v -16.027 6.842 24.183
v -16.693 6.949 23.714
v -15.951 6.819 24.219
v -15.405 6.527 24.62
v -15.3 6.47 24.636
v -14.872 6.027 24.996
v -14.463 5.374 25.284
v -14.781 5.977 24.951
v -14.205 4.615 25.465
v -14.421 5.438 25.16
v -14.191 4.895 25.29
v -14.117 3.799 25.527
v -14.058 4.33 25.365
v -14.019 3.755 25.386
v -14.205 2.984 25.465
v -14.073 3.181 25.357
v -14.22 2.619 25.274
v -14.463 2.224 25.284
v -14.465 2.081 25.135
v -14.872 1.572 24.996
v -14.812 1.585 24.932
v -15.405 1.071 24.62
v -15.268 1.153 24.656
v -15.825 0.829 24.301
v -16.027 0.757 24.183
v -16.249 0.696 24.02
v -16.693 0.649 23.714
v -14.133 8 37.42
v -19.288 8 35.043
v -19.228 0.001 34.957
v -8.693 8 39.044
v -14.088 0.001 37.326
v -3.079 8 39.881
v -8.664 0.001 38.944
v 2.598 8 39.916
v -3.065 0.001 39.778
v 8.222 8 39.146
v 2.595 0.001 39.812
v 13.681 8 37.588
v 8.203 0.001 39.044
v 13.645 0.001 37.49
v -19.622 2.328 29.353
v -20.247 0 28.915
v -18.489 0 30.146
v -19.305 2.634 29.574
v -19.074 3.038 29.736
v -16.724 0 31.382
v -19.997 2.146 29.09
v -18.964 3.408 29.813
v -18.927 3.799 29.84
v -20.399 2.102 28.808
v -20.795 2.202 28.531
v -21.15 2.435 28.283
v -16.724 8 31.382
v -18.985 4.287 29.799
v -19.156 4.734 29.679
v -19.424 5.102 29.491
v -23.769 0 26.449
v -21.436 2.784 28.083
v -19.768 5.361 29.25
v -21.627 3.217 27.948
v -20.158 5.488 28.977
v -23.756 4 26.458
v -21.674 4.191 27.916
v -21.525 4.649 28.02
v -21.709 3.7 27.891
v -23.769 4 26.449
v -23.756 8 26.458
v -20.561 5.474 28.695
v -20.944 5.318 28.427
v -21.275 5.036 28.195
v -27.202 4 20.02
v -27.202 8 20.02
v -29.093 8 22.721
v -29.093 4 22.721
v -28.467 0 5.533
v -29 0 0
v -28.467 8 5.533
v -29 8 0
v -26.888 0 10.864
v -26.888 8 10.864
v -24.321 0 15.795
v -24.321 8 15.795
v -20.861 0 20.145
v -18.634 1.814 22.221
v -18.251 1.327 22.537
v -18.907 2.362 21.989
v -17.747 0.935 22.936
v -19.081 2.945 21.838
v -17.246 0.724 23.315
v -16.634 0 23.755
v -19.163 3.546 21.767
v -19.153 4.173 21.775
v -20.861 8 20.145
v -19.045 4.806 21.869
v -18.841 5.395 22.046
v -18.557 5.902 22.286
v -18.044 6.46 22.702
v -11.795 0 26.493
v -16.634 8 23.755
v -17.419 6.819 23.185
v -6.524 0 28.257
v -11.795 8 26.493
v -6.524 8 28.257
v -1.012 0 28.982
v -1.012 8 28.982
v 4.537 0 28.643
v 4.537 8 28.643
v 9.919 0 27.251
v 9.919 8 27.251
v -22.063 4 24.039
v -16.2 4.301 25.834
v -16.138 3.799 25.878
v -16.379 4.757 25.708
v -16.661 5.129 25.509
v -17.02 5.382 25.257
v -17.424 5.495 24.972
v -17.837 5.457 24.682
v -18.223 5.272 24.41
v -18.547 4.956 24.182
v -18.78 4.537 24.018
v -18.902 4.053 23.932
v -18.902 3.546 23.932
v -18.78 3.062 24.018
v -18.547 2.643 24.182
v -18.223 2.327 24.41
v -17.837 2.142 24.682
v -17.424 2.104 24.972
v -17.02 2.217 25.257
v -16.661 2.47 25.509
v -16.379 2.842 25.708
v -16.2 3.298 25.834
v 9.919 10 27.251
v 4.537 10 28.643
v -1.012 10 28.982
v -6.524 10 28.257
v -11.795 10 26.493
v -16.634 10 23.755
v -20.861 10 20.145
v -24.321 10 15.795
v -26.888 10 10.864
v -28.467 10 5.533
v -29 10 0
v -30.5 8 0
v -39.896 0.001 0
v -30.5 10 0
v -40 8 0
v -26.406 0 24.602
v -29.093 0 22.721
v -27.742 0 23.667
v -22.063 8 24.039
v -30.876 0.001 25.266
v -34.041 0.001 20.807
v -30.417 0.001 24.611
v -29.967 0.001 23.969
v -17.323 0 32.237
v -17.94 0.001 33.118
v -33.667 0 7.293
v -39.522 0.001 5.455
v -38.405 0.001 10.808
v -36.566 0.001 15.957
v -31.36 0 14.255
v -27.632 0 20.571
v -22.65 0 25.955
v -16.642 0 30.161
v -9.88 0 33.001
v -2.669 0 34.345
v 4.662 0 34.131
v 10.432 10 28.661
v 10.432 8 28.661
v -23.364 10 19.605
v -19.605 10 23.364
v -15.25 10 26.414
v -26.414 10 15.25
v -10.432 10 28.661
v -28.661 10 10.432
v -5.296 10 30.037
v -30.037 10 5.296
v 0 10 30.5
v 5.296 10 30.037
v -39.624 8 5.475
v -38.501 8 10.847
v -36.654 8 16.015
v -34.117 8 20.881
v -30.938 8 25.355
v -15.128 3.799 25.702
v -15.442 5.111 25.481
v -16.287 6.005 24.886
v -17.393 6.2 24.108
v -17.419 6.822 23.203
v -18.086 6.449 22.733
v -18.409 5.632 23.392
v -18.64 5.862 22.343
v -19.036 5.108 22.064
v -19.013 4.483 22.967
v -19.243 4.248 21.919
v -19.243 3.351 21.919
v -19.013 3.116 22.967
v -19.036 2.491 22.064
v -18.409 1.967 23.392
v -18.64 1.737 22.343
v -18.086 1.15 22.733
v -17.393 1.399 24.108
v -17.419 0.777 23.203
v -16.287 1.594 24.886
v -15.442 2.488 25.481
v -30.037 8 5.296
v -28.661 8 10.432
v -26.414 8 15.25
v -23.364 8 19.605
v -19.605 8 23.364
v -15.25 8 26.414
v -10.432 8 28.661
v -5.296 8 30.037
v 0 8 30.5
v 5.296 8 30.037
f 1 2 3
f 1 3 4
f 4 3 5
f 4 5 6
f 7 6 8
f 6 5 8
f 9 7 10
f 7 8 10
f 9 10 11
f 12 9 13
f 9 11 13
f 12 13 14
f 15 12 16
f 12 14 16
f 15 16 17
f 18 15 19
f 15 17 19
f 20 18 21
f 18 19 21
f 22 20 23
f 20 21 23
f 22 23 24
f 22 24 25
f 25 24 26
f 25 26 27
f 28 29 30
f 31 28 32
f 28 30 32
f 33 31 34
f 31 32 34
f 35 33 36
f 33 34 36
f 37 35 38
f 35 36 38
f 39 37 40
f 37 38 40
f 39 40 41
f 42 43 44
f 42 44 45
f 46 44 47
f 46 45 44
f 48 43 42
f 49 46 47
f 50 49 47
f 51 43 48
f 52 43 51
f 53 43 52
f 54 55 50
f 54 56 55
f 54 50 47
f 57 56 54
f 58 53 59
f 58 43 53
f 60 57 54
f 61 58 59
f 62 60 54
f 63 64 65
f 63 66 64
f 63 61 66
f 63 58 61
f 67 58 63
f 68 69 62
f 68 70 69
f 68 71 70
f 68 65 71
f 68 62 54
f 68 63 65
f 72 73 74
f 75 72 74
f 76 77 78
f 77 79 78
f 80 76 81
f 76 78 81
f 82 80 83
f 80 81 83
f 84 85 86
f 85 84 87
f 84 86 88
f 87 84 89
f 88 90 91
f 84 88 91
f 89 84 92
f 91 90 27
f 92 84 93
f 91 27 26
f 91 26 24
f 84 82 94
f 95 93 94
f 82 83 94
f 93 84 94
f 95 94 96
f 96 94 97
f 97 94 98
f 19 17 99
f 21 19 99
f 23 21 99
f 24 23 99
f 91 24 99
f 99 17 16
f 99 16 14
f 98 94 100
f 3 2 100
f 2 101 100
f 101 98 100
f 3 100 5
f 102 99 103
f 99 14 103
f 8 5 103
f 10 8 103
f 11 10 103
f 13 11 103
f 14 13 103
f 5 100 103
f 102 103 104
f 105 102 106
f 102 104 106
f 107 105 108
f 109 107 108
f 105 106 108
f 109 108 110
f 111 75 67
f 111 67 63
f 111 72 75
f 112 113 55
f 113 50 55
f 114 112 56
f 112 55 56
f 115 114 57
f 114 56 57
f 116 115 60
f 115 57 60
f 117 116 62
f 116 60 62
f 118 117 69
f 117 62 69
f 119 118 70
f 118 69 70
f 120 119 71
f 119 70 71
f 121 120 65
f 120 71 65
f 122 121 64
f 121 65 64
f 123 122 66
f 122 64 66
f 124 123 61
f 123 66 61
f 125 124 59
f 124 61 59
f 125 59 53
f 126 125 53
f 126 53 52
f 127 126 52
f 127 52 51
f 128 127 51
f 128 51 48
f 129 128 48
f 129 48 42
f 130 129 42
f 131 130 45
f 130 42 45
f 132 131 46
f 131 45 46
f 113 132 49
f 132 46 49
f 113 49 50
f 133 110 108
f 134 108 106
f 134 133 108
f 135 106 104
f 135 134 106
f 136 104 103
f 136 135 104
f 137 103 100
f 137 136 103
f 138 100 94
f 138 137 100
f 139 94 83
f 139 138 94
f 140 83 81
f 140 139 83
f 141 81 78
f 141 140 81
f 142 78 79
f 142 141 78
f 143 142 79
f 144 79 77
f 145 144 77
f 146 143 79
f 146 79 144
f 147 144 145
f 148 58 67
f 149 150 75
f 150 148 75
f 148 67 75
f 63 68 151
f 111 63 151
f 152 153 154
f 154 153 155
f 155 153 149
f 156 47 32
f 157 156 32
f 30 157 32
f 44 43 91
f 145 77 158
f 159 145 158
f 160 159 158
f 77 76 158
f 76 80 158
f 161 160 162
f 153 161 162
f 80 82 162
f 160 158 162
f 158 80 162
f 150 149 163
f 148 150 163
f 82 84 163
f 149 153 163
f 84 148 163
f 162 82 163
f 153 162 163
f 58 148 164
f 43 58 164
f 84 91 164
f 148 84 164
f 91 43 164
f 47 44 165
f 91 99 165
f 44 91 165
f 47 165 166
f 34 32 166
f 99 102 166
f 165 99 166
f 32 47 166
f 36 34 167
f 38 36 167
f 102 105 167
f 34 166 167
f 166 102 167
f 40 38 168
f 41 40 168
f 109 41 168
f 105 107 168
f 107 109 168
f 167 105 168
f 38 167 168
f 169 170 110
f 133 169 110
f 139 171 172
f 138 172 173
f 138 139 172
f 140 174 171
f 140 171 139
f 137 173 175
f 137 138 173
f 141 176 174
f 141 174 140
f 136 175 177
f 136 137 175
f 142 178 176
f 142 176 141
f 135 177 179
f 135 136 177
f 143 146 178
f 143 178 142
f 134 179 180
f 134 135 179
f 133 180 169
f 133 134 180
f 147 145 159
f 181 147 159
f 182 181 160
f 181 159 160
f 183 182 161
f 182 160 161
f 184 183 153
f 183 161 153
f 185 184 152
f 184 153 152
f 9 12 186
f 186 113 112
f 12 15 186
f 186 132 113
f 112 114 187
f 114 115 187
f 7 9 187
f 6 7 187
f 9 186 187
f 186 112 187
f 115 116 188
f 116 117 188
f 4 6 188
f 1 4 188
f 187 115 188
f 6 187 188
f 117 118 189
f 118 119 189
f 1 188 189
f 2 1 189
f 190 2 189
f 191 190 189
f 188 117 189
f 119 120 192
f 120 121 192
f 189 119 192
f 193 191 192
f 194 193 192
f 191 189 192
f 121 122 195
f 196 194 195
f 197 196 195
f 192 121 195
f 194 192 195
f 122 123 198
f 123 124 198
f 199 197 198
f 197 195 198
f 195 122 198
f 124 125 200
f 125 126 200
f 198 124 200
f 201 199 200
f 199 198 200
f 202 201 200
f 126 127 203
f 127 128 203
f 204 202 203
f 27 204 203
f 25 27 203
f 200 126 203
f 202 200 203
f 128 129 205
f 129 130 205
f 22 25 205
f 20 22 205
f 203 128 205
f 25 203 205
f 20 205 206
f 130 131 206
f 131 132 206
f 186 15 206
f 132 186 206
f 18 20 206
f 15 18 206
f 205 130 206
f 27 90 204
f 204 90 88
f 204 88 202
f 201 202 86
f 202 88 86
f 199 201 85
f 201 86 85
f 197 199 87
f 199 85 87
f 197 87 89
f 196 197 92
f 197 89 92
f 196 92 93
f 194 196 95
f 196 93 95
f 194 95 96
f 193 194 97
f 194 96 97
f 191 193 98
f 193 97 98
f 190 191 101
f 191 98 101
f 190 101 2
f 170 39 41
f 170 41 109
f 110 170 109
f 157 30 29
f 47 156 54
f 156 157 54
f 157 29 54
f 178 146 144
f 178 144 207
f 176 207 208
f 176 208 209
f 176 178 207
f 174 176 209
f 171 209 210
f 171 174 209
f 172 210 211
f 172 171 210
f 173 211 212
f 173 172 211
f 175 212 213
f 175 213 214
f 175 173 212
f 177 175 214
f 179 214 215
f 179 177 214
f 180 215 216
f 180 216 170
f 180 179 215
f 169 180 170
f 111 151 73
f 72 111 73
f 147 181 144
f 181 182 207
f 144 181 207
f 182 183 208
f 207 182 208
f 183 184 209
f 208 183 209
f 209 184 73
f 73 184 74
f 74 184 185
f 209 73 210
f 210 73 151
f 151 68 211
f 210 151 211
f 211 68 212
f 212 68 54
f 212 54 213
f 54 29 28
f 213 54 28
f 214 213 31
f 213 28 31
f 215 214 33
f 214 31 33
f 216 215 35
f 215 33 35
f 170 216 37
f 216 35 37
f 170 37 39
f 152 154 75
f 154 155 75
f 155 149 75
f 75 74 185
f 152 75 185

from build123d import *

# Parameters (mm, degrees)
REVOLVE1_ANGLE                                      = 110
BOSS_EXTRUDE2_START                                 = 2
BOSS_EXTRUDE2_DEPTH                                 = 2
CUT_EXTRUDE3_DEPTH                                  = 4.3
CUT_EXTRUDE3_DEPTH_BACK                             = 4.3
SKETCH6_W                                           = 4.978949903
SKETCH6_H                                           = 35.147852634
CSK_FOR_M3_COUNTERSUNK_FLAT_HEAD_SCREW1_D           = 3.4
CSK_FOR_M3_COUNTERSUNK_FLAT_HEAD_SCREW1_CSINK_D     = 6.3
CSK_FOR_M3_COUNTERSUNK_FLAT_HEAD_SCREW1_CSINK_ANGLE = 90
CUT_EXTRUDE4_DEPTH                                  = 58.131427582
CUT_EXTRUDE5_DEPTH                                  = 4


with BuildPart() as part:
    # Sketch1 → Revolve1 (revolve)
    with BuildSketch(Plane.XY):
        Polygon((-29, 0), (-29, 8), (-40, 8), (-39.896417966, 0.000670605), align=None)
    revolve(axis=Axis((0, 0, 0), (0, 1, 0)), revolution_arc=REVOLVE1_ANGLE)

    # Sketch2 → Boss-Extrude2 (add)
    with BuildSketch(Plane(origin=(0, 8, 0), x_dir=(1, 0, 0), z_dir=(0, 1, 0)).offset(BOSS_EXTRUDE2_START)):
        with BuildLine():
            Line((-29, 0), (-30.5, 0))
            ThreePointArc((-30.5, 0), (-17.494081309, -24.984137351), (10.431614371, -28.660624934))
            Line((10.431614371, -28.660624934), (9.918584156, -27.251086003))
            ThreePointArc((9.918584156, -27.251086003), (-16.633716654, -23.755409284), (-29, 0))
        make_face()
    extrude(amount=-BOSS_EXTRUDE2_DEPTH)

    # Sketch6 → Cut-Extrude3 (cut, two sides: drawn at the far end of the back side and taken through both)
    with BuildSketch(Plane(origin=(0, 0, 0), x_dir=(0.5735764363510444, 0, -0.819152044288993), z_dir=(0.819152044288993, 0, 0.5735764363510444)).offset(-CUT_EXTRUDE3_DEPTH_BACK)):
        with Locations((-37.788406982, 11.886060953)):
            Rectangle(SKETCH6_W, SKETCH6_H)
    extrude(amount=CUT_EXTRUDE3_DEPTH + CUT_EXTRUDE3_DEPTH_BACK, mode=Mode.SUBTRACT)

    # CSK for M3 Countersunk Flat Head Screw1 (through all)
    with Locations(Plane(origin=(-16.693228701, 3.799474552, 23.713627212), x_dir=(-0.817711283166, 0, -0.575628575891), z_dir=(0.575628575891, 0, -0.817711283166))):
        with Locations((0, 0)):
            CounterSinkHole(CSK_FOR_M3_COUNTERSUNK_FLAT_HEAD_SCREW1_D / 2, CSK_FOR_M3_COUNTERSUNK_FLAT_HEAD_SCREW1_CSINK_D / 2, counter_sink_angle=CSK_FOR_M3_COUNTERSUNK_FLAT_HEAD_SCREW1_CSINK_ANGLE)

    # Sketch13 → Cut-Extrude4 (cut, through all)
    with BuildSketch(Plane(origin=(0, 8, 0), x_dir=(1, 0, 0), z_dir=(0, 1, 0))):
        Polygon((-23.768989432, -26.448813658), (-29.09347772, -22.720566822), (-32.344693082, -27.363783561), (-27.020204794, -31.092030397), align=None)
    extrude(amount=-CUT_EXTRUDE4_DEPTH, mode=Mode.SUBTRACT)

    # Sketch14 → Cut-Extrude5 (cut)
    with BuildSketch(Plane(origin=(0, 8, 0), x_dir=(1, 0, 0), z_dir=(0, 1, 0))):
        Polygon((-29.09347772, -22.720566822), (-23.756197421, -26.457770721), (-22.0628619, -24.039436971), (-27.202235941, -20.019593646), align=None)
    extrude(amount=-CUT_EXTRUDE5_DEPTH, mode=Mode.SUBTRACT)


solid = part.part
